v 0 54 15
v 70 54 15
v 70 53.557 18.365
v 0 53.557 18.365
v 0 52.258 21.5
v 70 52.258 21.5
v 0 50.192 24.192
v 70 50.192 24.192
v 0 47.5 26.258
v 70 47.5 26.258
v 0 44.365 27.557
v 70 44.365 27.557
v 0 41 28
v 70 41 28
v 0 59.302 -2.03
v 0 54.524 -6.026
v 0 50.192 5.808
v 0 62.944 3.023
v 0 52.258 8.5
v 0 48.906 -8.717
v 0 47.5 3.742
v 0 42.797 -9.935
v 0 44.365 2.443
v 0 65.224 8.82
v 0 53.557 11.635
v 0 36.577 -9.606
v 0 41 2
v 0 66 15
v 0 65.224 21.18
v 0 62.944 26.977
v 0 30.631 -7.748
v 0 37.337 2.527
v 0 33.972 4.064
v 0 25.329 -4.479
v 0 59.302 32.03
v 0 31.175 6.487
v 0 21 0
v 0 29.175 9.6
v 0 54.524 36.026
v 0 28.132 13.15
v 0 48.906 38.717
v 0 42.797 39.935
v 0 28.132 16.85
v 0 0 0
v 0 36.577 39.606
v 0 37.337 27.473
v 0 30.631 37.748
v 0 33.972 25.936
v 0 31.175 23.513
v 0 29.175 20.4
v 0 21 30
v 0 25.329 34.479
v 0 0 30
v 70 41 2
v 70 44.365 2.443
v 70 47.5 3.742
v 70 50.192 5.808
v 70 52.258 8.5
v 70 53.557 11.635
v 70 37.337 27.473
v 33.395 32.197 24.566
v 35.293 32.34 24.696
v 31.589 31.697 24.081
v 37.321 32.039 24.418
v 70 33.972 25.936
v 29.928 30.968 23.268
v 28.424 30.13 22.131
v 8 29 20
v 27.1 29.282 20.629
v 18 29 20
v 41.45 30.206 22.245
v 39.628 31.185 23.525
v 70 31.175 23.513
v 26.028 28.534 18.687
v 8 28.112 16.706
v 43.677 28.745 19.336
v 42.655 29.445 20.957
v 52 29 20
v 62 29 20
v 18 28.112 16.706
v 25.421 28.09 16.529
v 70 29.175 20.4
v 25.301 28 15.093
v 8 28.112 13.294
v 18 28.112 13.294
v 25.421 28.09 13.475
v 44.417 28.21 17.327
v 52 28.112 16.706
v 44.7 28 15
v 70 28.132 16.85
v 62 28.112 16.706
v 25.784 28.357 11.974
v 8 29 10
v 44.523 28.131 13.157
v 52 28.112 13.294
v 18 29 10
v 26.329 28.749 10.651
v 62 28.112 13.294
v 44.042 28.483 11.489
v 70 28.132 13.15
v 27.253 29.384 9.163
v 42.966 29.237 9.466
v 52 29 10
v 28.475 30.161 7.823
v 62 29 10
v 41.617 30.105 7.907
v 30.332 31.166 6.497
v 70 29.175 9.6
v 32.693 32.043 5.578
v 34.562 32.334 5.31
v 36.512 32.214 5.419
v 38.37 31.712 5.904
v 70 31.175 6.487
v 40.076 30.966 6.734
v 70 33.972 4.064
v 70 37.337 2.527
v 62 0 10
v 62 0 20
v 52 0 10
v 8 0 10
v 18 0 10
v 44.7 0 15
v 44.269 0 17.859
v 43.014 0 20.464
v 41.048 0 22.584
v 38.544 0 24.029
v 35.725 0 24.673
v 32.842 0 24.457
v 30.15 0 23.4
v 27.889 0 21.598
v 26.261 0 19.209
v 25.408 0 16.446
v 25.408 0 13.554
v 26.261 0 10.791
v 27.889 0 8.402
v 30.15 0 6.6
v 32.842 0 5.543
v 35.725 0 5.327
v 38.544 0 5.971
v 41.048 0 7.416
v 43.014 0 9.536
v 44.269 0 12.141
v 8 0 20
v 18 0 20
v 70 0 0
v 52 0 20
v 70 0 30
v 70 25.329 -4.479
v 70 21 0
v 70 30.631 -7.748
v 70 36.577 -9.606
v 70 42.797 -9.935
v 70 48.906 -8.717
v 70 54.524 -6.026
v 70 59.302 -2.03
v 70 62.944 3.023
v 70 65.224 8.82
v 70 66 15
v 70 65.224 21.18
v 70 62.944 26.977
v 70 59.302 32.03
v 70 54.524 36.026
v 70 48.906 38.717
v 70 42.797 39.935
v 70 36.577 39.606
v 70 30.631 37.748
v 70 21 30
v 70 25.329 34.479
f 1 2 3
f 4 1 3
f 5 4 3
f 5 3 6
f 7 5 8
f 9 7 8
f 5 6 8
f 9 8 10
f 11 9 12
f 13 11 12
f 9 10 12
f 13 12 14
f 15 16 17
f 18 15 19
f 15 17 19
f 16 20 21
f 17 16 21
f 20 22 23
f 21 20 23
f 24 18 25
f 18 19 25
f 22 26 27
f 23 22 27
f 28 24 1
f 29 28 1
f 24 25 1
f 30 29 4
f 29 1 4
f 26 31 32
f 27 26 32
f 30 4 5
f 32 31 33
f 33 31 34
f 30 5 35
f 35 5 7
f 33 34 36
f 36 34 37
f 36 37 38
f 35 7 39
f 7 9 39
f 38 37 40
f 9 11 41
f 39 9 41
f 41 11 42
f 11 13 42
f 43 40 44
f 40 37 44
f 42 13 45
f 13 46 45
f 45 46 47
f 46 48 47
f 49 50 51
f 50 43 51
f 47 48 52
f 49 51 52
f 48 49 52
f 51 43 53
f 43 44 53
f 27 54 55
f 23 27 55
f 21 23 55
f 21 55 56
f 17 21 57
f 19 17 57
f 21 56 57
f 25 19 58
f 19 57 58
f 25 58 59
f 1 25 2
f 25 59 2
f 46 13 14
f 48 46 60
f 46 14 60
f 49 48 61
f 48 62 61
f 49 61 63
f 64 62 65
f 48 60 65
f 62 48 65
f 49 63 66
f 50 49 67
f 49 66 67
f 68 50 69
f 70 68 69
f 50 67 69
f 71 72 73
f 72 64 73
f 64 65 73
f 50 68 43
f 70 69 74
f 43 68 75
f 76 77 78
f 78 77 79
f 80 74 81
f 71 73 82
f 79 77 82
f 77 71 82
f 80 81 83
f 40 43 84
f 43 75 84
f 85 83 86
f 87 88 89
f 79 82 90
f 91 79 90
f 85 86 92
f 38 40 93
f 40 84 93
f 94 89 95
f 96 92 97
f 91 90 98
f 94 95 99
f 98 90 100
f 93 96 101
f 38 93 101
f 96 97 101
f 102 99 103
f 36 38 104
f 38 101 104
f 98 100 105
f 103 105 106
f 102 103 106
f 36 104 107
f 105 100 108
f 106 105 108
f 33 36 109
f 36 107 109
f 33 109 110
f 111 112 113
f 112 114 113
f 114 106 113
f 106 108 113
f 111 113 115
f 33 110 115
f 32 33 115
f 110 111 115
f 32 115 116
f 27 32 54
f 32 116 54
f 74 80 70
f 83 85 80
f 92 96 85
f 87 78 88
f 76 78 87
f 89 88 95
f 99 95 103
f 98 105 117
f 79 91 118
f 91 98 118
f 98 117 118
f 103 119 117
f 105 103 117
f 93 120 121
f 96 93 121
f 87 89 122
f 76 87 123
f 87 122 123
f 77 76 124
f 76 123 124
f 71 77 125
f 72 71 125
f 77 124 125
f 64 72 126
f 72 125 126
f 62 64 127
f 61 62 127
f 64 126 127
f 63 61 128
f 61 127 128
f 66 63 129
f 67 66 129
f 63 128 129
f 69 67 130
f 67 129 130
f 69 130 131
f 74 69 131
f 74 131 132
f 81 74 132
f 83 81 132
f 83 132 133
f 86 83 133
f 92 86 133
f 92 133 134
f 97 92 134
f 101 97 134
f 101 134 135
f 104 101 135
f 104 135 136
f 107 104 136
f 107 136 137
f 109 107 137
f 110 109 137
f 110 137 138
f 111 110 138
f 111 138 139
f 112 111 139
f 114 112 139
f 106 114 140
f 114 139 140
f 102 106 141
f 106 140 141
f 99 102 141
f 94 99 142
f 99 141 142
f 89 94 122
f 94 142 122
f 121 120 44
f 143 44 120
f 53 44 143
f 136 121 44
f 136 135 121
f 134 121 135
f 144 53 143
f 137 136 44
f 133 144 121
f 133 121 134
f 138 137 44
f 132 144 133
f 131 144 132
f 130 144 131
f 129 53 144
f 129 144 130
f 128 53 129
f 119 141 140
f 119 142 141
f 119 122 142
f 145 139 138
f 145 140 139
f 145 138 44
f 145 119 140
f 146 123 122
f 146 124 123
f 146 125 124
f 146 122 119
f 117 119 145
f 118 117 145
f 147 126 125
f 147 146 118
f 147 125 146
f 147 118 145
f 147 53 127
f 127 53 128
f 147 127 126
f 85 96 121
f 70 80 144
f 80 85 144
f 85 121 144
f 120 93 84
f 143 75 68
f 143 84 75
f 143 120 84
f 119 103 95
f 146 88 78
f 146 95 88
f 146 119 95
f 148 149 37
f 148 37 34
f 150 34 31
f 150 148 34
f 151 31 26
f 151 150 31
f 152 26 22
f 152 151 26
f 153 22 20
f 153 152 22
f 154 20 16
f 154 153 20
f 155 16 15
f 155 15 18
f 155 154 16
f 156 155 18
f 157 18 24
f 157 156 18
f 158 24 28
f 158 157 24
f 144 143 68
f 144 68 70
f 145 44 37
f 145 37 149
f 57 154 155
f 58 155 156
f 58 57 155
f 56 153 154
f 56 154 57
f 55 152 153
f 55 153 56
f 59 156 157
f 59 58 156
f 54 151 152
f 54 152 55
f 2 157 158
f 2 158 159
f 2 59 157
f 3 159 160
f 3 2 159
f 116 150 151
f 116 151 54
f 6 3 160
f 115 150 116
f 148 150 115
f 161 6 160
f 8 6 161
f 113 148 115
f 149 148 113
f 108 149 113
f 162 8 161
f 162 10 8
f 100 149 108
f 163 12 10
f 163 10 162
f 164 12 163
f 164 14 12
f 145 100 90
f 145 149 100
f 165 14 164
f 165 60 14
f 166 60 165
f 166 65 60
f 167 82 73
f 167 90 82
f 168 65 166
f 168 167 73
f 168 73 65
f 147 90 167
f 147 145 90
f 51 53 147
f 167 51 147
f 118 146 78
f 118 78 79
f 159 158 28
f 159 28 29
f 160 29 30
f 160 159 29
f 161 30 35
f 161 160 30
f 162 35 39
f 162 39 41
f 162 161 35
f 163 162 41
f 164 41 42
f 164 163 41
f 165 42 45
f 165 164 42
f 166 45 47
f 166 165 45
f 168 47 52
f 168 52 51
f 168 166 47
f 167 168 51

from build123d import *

# Parameters (mm, degrees)
F0_W     = 70
F0_H     = 30
F1_DEPTH = 41
F2_W     = 10
F2_H     = 10
F2_R     = 9.6999339811
F3_DEPTH = 41
F5_DEPTH = 70
F6_DEPTH = 70


with BuildPart() as f1:
    # F0 (on Front) → F1 (new body)
    with BuildSketch(Plane.XZ):
        with Locations((35, 15)):
            Rectangle(F0_W, F0_H)
    extrude(amount=-F1_DEPTH)

    # F2 (on face) → F3 (cut)
    with BuildSketch(Plane.XZ):
        with Locations((13, 15)):
            Rectangle(F2_W, F2_H)
        with Locations((35, 15)):
            Circle(F2_R)
        with Locations((57, 15)):
            Rectangle(F2_W, F2_H)
    extrude(amount=-F3_DEPTH, mode=Mode.SUBTRACT)

    # F4 (on face) → F5 (join)
    with BuildSketch(Plane.YZ.offset(70)):
        with BuildLine():
            ThreePointArc((54, 15), (50.1923881554, 24.1923881554), (41, 28))
            Line((41, 28), (41, 2))
            ThreePointArc((41, 2), (50.1923881554, 5.8076118446), (54, 15))
        make_face()
        with BuildLine():
            Line((41, 2), (41, 28))
            ThreePointArc((41, 28), (28, 15), (41, 2))
        make_face()
        with BuildLine():
            ThreePointArc((21, 0), (48.9056941504, -8.7170824513), (66, 15))
            ThreePointArc((66, 15), (48.9056941504, 38.7170824513), (21, 30))
            Line((21, 30), (41, 30))
            Line((41, 30), (41, 28))
            ThreePointArc((41, 28), (50.1923881554, 24.1923881554), (54, 15))
            ThreePointArc((54, 15), (50.1923881554, 5.8076118446), (41, 2))
            Line((41, 2), (41, 0))
            Line((41, 0), (21, 0))
        make_face()
    extrude(amount=-F5_DEPTH)

    # F4 (on face) → F6 (cut)
    with BuildSketch(Plane.YZ.offset(70)):
        with BuildLine():
            ThreePointArc((54, 15), (50.1923881554, 24.1923881554), (41, 28))
            Line((41, 28), (41, 2))
            ThreePointArc((41, 2), (50.1923881554, 5.8076118446), (54, 15))
        make_face()
        with BuildLine():
            Line((41, 2), (41, 28))
            ThreePointArc((41, 28), (28, 15), (41, 2))
        make_face()
    extrude(amount=-F6_DEPTH, mode=Mode.SUBTRACT)


solid = f1.part
